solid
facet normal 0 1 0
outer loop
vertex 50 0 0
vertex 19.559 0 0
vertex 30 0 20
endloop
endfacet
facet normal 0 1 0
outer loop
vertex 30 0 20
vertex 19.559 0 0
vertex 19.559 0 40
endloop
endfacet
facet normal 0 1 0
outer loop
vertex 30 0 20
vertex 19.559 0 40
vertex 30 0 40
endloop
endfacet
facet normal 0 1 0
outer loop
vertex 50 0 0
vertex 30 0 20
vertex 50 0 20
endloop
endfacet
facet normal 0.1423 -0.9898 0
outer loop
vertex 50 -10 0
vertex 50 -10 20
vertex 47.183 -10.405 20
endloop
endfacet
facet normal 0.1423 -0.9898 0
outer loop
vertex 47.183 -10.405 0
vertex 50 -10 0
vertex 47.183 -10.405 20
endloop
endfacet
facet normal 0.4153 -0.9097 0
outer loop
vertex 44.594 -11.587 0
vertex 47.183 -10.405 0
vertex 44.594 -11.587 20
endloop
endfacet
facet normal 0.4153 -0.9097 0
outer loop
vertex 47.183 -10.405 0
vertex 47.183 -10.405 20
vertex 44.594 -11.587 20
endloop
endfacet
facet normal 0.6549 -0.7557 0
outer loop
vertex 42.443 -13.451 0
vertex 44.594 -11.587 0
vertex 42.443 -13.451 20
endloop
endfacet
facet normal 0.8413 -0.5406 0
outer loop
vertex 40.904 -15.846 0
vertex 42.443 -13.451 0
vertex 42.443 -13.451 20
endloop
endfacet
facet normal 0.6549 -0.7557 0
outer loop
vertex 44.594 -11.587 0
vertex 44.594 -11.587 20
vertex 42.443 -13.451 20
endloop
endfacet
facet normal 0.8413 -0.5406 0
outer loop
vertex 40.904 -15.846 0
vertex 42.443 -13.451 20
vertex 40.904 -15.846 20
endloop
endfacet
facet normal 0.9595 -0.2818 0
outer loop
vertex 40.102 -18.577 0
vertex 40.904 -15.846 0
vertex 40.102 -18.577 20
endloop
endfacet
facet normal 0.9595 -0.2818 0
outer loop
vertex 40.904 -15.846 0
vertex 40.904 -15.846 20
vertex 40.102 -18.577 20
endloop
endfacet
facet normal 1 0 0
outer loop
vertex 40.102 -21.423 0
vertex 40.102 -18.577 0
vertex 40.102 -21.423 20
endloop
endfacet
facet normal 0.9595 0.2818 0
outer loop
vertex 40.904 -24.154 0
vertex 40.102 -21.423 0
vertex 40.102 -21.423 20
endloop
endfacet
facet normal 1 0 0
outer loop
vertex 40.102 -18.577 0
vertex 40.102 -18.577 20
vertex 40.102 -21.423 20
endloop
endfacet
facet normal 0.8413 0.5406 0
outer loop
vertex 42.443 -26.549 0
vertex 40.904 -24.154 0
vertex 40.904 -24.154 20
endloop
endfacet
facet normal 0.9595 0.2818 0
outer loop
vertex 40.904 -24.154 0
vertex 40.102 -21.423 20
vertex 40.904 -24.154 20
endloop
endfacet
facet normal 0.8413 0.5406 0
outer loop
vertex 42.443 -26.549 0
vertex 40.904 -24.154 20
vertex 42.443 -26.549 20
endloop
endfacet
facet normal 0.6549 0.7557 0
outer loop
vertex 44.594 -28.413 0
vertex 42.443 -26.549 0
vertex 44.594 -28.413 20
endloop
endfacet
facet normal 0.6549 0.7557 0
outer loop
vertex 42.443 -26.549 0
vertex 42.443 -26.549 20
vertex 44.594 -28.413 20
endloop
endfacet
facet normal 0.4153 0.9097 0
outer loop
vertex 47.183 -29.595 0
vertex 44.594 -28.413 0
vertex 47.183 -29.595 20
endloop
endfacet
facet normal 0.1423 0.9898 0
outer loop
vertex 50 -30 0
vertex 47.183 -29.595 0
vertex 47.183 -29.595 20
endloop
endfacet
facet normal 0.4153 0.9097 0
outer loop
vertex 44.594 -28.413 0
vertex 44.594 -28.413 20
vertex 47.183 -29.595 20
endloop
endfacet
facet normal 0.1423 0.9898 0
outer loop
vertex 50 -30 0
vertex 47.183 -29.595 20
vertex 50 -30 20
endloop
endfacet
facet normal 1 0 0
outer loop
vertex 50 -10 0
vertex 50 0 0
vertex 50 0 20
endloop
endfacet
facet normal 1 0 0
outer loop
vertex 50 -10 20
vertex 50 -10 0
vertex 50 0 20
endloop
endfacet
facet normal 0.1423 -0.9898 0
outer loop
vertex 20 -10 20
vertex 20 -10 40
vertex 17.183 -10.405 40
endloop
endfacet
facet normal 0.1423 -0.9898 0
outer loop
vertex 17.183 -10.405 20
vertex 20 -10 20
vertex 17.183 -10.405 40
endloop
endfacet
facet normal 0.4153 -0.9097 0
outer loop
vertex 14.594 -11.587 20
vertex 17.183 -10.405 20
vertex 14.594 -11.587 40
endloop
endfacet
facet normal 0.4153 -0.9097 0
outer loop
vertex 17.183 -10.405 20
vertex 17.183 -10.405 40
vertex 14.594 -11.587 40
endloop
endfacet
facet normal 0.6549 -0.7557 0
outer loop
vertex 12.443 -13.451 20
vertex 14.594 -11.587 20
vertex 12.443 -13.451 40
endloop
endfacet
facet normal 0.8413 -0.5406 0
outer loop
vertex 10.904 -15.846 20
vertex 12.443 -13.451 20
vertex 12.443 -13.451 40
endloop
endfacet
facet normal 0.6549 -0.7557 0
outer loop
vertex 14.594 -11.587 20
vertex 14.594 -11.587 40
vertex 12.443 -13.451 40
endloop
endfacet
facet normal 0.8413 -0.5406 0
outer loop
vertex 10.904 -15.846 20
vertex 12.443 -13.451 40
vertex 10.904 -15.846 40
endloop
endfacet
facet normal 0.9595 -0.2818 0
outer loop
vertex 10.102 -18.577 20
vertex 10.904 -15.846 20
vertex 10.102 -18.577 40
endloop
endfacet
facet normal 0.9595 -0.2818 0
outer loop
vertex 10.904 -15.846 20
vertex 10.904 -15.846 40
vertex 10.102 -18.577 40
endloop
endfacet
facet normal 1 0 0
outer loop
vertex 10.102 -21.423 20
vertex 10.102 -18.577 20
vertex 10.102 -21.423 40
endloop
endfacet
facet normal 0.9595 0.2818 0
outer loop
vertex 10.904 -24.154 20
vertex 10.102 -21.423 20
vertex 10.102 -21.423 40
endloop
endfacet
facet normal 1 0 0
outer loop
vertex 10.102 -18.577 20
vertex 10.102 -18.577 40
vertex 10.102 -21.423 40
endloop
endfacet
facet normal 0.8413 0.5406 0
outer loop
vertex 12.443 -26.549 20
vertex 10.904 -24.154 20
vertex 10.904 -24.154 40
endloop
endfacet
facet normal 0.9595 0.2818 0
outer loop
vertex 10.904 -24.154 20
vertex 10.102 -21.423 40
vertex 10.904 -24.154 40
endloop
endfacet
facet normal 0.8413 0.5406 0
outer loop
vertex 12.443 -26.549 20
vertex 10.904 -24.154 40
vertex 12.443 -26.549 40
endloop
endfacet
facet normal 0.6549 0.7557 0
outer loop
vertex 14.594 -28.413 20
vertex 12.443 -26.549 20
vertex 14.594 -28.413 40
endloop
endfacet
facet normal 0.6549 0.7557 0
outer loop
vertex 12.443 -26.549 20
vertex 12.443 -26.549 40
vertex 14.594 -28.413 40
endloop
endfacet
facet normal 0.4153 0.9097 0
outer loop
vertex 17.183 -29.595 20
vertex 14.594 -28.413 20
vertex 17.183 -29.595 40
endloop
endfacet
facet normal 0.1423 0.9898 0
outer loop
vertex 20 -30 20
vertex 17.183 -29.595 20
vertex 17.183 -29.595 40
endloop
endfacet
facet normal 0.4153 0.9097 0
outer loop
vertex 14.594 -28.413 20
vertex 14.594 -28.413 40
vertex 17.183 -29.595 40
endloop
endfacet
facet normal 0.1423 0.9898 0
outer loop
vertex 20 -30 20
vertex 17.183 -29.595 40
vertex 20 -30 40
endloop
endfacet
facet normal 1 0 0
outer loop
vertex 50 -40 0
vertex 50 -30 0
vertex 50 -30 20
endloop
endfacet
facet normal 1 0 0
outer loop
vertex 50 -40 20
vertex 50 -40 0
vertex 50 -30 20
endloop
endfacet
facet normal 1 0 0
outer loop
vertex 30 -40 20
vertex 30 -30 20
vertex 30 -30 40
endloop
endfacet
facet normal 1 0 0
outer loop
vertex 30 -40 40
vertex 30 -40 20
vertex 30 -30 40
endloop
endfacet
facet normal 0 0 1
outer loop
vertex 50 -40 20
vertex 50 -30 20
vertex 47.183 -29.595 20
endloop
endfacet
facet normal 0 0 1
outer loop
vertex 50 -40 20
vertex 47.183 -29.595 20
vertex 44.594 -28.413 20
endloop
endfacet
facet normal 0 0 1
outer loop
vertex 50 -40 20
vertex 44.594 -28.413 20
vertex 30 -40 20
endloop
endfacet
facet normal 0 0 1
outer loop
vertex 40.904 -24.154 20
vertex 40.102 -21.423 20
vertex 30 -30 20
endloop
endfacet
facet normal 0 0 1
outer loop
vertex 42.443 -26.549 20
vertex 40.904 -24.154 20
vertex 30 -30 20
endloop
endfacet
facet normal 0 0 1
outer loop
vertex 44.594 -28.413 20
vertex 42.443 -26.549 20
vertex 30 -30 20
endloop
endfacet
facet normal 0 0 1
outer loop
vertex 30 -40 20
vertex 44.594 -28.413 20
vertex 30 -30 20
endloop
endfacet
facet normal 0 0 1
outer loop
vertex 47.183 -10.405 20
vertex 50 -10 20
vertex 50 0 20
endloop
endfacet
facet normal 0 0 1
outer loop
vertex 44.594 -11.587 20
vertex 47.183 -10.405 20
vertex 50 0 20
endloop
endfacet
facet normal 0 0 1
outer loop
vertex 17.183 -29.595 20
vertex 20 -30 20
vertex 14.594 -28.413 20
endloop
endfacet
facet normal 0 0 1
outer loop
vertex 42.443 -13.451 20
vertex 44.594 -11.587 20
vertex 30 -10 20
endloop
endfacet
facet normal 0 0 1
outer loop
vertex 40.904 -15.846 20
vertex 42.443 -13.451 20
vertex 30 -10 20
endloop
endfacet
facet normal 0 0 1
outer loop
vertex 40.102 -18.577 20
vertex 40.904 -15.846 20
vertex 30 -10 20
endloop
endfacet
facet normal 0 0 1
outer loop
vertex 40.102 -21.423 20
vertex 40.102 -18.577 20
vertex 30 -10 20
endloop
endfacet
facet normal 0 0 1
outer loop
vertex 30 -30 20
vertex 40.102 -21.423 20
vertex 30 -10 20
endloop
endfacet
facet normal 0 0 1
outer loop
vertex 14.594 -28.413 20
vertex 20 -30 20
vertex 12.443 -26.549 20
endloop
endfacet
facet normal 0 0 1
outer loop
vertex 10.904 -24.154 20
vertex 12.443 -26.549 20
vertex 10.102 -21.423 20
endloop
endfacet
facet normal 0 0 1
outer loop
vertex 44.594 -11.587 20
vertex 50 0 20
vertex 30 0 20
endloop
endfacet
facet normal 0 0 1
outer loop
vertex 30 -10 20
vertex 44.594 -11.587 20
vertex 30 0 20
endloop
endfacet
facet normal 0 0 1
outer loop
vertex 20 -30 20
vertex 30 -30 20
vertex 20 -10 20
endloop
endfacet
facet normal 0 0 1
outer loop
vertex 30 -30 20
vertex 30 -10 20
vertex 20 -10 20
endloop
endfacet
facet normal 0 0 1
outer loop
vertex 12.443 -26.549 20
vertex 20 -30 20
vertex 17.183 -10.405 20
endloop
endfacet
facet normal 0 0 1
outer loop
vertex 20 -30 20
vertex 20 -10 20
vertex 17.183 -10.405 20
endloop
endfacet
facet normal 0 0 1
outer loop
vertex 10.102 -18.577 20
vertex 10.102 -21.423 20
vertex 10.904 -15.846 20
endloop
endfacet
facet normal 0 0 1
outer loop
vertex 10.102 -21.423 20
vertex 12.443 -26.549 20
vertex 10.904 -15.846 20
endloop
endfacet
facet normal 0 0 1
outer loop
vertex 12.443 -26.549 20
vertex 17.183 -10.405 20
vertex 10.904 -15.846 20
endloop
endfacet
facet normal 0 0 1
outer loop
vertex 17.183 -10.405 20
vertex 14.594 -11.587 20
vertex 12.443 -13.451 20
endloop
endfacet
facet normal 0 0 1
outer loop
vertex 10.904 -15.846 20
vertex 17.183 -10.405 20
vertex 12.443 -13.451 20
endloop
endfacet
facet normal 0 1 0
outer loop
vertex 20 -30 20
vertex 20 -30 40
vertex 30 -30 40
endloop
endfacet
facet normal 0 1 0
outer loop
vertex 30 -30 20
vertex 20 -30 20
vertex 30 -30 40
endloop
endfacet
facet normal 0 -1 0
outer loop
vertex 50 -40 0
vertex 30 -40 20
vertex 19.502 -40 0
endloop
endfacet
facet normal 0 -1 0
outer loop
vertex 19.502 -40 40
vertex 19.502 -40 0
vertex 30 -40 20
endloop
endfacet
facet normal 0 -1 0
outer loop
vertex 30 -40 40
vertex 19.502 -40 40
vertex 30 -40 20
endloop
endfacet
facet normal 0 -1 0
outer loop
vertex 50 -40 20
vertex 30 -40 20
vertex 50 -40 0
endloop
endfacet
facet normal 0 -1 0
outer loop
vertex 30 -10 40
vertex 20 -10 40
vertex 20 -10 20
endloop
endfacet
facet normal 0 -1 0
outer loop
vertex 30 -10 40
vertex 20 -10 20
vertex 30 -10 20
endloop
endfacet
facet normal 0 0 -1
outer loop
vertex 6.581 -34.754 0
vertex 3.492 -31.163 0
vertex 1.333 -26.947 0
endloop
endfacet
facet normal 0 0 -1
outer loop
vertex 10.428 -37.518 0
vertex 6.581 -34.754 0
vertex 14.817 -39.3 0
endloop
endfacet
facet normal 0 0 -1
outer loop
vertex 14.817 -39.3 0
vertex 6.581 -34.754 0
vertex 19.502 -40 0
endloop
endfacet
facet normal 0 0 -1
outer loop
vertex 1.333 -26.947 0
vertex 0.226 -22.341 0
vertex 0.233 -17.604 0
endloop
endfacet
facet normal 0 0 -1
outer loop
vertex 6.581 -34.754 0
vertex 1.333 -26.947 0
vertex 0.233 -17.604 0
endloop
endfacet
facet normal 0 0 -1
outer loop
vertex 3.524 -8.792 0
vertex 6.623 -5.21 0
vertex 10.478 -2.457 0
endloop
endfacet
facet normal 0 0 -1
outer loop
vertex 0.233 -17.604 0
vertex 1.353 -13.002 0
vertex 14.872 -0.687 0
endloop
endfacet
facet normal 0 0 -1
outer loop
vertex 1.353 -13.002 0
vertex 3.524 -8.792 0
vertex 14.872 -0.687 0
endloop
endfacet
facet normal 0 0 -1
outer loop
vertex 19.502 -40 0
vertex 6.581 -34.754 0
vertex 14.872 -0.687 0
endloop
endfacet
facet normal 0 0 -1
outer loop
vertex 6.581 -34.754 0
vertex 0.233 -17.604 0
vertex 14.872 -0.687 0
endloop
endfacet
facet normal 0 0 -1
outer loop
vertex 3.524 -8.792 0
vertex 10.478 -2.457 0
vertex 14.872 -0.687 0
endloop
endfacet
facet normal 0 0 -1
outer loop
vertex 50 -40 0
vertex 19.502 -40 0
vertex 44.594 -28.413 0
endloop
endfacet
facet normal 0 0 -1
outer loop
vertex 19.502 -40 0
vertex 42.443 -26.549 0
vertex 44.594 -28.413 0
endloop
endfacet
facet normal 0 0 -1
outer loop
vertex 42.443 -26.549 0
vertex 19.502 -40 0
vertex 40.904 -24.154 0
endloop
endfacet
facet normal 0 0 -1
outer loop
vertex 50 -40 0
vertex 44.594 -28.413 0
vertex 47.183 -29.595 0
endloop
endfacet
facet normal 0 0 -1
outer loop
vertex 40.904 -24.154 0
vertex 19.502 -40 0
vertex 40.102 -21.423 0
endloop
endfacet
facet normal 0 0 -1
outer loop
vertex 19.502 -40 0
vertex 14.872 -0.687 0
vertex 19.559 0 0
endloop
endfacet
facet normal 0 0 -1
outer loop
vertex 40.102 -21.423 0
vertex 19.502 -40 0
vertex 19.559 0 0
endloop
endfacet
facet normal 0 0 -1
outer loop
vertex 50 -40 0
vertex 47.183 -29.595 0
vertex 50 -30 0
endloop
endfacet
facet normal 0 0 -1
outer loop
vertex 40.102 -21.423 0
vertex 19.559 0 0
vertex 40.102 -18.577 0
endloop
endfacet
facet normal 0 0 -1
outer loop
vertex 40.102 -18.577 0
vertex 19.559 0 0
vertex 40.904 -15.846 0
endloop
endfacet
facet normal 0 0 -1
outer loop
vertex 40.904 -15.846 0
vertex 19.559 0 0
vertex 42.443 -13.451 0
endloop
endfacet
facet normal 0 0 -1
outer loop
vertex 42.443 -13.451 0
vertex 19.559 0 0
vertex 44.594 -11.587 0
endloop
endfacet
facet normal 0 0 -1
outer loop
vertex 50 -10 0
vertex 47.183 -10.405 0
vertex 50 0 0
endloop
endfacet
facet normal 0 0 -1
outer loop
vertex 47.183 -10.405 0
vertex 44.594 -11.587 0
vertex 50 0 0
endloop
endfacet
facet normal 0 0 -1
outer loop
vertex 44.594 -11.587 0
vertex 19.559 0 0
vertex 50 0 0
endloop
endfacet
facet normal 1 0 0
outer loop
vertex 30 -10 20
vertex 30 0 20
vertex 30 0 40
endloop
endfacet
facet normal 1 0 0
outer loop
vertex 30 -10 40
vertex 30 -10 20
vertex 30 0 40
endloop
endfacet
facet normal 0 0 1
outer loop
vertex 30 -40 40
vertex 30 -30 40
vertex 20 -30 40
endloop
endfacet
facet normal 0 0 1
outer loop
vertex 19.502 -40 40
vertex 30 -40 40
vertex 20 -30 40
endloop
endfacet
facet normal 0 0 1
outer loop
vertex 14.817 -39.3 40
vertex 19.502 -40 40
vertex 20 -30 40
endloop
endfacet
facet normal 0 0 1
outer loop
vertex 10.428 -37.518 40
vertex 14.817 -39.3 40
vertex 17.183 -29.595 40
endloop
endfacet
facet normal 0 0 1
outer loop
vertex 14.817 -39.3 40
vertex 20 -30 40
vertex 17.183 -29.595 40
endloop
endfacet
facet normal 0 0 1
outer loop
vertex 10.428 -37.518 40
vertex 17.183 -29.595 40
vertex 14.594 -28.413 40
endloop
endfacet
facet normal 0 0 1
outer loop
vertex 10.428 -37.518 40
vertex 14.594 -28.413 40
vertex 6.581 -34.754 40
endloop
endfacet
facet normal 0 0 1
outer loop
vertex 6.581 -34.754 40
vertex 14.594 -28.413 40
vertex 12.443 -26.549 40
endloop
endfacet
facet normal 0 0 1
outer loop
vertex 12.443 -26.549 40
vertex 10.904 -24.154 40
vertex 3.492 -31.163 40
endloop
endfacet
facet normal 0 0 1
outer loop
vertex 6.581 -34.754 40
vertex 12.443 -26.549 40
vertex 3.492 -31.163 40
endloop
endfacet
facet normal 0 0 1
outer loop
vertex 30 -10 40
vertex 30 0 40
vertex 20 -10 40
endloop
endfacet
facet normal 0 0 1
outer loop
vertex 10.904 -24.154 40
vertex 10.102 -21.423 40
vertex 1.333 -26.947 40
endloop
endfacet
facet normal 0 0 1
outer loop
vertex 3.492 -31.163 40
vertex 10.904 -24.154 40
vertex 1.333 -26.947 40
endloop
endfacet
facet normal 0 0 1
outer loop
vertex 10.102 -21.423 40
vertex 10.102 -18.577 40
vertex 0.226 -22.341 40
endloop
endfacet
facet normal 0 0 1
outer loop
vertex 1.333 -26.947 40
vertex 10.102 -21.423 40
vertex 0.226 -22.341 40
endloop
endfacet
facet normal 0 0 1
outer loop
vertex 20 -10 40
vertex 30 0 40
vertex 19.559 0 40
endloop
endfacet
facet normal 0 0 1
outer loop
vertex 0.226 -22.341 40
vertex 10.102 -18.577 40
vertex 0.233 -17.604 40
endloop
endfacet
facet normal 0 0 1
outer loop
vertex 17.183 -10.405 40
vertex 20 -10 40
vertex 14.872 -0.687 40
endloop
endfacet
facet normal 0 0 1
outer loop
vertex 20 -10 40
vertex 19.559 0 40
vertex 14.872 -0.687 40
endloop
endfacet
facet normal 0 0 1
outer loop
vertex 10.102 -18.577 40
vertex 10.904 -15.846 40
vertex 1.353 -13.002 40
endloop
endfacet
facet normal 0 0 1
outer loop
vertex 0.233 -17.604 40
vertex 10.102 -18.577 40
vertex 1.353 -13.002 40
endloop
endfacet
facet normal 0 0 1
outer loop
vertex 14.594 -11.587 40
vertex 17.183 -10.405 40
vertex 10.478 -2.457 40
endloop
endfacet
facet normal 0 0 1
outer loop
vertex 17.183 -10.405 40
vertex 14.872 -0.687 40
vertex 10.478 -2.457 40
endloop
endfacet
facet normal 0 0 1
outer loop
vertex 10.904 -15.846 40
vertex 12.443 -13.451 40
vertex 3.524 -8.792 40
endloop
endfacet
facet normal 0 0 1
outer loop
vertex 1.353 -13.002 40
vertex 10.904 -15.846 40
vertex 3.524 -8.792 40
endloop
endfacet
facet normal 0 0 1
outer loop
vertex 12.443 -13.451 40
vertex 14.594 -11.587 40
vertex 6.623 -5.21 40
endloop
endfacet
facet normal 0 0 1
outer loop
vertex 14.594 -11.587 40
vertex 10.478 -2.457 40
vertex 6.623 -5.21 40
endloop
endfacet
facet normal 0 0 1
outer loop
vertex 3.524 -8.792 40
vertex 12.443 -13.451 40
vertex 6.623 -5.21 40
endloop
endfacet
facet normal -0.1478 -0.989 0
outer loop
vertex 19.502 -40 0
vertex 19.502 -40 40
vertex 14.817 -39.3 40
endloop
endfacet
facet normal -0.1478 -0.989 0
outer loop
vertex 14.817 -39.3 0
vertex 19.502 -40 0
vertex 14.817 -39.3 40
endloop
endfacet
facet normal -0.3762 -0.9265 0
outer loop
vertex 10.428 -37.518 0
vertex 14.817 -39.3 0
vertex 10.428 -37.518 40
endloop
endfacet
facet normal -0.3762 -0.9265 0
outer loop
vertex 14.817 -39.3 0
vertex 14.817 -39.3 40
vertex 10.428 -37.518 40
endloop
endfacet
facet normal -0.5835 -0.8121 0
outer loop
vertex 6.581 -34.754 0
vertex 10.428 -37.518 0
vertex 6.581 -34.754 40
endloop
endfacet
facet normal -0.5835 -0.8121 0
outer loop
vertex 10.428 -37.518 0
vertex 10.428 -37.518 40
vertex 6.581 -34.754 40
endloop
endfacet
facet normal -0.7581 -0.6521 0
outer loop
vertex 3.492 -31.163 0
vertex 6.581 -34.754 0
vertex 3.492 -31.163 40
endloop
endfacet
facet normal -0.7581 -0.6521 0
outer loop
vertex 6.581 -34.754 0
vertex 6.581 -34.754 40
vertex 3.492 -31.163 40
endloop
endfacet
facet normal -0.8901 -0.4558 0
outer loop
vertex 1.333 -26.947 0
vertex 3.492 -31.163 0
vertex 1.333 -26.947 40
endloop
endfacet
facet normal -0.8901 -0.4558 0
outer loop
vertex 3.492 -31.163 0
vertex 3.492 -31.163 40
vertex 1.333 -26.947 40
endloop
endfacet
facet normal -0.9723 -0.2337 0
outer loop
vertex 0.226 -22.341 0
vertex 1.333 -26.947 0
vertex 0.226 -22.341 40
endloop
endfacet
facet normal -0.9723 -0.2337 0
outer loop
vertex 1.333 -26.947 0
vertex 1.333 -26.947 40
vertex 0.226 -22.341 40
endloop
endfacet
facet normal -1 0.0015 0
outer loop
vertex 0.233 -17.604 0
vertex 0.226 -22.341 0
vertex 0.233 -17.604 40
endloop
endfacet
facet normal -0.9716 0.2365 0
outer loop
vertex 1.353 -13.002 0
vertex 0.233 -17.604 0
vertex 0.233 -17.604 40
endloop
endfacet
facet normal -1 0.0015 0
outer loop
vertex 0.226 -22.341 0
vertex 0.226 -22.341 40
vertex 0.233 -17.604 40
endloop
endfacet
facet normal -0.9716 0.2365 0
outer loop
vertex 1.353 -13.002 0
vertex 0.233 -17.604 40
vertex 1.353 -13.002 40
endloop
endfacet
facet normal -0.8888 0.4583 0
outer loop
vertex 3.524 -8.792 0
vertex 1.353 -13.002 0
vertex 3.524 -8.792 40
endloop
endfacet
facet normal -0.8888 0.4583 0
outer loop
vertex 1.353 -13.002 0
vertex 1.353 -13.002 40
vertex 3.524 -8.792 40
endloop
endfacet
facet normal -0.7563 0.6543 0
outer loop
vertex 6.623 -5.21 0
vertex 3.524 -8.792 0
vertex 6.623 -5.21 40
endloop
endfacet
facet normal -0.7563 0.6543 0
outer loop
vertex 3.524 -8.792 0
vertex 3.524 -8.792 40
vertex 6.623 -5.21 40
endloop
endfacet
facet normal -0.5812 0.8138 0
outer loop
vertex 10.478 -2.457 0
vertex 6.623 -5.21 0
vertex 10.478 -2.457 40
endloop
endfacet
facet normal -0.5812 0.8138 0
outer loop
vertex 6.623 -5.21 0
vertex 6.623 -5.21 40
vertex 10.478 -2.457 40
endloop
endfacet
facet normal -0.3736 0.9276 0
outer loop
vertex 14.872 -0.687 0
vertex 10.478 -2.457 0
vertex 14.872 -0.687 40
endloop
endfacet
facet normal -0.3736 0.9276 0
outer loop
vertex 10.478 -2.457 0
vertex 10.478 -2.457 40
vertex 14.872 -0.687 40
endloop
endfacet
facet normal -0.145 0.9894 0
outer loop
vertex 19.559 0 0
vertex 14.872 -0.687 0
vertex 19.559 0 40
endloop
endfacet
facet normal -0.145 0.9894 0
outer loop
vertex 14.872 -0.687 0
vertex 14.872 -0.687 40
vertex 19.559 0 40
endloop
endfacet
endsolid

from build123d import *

# Parameters (mm, degrees)
F1_DEPTH = 40
F3_DEPTH = 40
F4_W     = 10
F4_H     = 20
F5_DEPTH = 20
F7_DEPTH = 20
F9_DEPTH = 20


with BuildPart() as f1:
    # F0 (on Front) → F1 (new body)
    with BuildSketch(Plane.XZ):
        Polygon((0, 40), (0, 0), (50, 0), (50, 20), (30, 20), (30, 40), align=None)
    extrude(amount=F1_DEPTH)

    # F2 (on face) → F3 (cut)
    with BuildSketch(Plane.XY.offset(40)):
        with BuildLine():
            ThreePointArc((19.502008, -40), (0.089083, -19.972422), (19.55875, 0))
            Line((19.55875, 0), (0, 0))
            Line((0, 0), (0, -40))
            Line((0, -40), (19.502008, -40))
        make_face()
    extrude(amount=-F3_DEPTH, mode=Mode.SUBTRACT)

    # F4 (on face) → F5 (cut)
    with BuildSketch(Plane.XY.offset(40)):
        with Locations((25, -20)):
            Rectangle(F4_W, F4_H)
    extrude(amount=-F5_DEPTH, mode=Mode.SUBTRACT)

    # F6 (on face) → F7 (cut)
    with BuildSketch(Plane.XY.offset(40)):
        with BuildLine():
            Line((20, -30), (20, -10))
            ThreePointArc((20, -10), (10, -20), (20, -30))
        make_face()
    extrude(amount=-F7_DEPTH, mode=Mode.SUBTRACT)

    # F8 (on face) → F9 (cut)
    with BuildSketch(Plane.XY.offset(20)):
        with BuildLine():
            Line((50, -30), (50, -10))
            ThreePointArc((50, -10), (40, -20), (50, -30))
        make_face()
    extrude(amount=-F9_DEPTH, mode=Mode.SUBTRACT)


solid = f1.part
